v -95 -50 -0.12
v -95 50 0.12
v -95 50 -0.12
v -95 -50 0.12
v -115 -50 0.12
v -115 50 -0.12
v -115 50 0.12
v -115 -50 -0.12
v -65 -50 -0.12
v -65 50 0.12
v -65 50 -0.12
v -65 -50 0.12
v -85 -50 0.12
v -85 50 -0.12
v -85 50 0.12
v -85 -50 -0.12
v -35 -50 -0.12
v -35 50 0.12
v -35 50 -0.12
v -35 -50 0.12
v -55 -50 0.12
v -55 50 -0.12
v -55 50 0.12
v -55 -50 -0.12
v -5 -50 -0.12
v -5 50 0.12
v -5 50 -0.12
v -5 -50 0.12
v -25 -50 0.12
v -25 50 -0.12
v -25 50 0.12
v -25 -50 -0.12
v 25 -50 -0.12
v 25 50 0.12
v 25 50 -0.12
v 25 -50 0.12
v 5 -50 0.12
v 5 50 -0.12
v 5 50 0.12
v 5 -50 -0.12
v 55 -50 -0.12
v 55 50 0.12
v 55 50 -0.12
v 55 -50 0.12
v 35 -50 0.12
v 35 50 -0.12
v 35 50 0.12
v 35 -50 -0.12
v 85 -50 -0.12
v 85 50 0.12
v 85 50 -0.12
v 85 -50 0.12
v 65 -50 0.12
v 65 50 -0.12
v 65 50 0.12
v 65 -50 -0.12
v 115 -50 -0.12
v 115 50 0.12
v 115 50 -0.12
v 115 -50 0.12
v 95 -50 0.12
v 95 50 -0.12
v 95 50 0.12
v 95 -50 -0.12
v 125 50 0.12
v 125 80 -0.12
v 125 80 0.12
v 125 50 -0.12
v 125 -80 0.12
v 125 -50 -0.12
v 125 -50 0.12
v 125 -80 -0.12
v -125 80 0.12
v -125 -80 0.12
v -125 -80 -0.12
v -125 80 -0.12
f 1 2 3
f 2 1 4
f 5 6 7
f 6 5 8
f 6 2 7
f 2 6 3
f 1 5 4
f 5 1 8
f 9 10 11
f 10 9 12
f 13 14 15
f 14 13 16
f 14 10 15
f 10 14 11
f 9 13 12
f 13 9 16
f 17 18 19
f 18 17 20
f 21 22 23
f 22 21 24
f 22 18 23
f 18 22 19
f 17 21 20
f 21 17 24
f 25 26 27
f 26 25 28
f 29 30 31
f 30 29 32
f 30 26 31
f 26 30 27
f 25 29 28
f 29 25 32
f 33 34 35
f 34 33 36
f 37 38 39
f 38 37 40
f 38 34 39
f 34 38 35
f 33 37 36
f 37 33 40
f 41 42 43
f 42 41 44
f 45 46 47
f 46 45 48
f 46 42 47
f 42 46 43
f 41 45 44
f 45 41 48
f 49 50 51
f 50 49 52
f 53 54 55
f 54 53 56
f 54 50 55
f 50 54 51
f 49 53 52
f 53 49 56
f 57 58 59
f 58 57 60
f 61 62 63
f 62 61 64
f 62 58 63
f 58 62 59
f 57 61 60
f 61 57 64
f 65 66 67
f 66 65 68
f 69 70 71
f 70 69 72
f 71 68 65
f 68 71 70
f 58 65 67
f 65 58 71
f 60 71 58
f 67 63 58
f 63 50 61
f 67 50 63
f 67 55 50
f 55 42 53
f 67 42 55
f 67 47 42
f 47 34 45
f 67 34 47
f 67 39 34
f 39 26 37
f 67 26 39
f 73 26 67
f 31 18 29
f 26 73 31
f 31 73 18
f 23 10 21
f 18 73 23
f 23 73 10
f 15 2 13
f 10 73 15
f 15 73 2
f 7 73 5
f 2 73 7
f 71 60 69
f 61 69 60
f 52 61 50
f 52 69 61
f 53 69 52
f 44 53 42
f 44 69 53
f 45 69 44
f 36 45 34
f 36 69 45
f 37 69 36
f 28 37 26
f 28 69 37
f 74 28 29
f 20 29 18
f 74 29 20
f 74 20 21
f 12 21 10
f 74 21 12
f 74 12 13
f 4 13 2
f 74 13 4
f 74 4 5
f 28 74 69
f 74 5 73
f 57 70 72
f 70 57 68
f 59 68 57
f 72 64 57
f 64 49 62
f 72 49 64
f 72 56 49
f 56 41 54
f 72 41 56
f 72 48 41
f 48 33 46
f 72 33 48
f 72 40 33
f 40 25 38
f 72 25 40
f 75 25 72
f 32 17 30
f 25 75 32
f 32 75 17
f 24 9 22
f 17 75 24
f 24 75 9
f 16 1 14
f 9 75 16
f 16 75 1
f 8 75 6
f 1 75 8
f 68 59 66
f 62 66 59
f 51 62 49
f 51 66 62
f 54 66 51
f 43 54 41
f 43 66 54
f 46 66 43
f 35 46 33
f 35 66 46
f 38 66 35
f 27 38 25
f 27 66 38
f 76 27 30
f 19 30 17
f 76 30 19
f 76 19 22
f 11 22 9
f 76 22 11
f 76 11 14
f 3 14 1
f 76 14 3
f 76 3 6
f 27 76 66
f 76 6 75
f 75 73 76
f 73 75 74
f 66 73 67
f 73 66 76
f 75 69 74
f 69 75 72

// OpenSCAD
// Modified Doctor Blade sheet
w = 250;
h = 160;
d = 0.24; // 240um

electrode_width = 20;
electrode_height = 100;

difference() {
    cube([w, h, d], true);
    
    // Loop to create multiple instances of the second cube
    for (x = [0 : 20+10 : 250]) {
        translate([x - w/2 + 20, 0, 0])
            cube([electrode_width, electrode_height, d+0.1], true);
    }
}
